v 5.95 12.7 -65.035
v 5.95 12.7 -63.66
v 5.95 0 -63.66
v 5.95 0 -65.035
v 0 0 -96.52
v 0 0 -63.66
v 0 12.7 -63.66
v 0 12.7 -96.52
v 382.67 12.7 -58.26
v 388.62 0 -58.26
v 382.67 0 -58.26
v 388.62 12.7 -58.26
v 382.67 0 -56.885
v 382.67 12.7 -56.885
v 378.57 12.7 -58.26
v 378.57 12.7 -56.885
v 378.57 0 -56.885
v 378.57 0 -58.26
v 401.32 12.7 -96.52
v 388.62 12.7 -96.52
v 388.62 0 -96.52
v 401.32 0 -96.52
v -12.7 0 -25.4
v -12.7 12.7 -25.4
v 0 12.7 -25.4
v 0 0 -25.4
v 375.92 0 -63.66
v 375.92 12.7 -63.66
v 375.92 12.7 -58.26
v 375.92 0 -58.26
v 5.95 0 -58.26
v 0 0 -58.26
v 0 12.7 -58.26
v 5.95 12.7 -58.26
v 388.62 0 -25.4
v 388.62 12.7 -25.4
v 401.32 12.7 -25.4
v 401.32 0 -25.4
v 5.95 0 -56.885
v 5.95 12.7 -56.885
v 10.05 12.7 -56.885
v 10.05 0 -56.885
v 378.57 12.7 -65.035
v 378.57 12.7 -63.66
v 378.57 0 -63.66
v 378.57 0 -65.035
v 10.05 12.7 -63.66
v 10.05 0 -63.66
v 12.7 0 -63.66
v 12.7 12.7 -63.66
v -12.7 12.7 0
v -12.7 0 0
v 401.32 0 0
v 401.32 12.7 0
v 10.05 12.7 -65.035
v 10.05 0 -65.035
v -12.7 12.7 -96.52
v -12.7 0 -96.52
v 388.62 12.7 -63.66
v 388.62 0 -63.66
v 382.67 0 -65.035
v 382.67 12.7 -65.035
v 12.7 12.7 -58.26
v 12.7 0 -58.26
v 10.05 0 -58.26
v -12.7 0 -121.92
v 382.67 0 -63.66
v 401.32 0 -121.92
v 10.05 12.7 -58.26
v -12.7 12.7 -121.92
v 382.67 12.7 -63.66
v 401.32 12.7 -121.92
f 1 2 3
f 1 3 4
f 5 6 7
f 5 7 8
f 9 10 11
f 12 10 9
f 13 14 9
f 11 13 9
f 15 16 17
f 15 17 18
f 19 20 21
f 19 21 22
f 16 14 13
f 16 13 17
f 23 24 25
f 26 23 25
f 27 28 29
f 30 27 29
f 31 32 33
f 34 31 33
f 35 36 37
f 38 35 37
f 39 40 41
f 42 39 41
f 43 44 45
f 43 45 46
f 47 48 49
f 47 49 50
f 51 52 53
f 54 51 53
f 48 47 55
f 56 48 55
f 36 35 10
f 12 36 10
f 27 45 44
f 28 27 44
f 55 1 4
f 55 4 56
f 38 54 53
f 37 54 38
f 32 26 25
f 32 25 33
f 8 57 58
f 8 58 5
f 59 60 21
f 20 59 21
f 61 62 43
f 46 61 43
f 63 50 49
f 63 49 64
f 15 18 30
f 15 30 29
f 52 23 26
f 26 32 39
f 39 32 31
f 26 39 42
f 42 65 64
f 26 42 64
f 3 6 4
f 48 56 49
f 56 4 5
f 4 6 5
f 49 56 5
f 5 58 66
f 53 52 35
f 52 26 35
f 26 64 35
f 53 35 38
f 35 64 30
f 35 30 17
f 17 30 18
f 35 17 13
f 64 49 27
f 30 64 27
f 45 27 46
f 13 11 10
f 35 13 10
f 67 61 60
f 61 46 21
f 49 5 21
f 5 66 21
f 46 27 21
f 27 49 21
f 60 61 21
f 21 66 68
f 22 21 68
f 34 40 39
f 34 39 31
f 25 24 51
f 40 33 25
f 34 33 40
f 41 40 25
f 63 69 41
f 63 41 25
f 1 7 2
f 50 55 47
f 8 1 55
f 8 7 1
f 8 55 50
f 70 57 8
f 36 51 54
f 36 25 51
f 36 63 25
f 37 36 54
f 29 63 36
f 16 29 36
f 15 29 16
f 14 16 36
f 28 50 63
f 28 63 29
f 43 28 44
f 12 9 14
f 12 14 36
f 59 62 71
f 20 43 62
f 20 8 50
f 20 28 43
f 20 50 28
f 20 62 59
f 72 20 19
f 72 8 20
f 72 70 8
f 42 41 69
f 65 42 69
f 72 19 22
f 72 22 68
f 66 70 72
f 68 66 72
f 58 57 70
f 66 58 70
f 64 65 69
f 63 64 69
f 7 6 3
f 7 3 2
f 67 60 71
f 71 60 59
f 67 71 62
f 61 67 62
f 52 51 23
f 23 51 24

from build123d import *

# Parameters (mm, degrees)
SKETCH1_W           = 388.62
SKETCH1_H           = 121.92
BOSS_EXTRUDE1_DEPTH = 12.7
SKETCH3_W           = 12.7
SKETCH3_H           = 25.4
TABS_DEPTH          = 12.7
SKETCH4_W           = 5.4
SKETCH4_H           = 12.7
SCREW_SLOT_DEPTH    = 12.7
SKETCH5_W           = 4.1
SKETCH5_H           = 8.15
NUT_SLOT_DEPTH      = 12.7


with BuildPart() as part:
    # Sketch1 → Boss-Extrude1 (new body)
    with BuildSketch(Plane(origin=(0, 0, 0), x_dir=(1, 0, 0), z_dir=(0, 1, 0))):
        with Locations((194.31, 60.96)):
            Rectangle(SKETCH1_W, SKETCH1_H)
    extrude(amount=BOSS_EXTRUDE1_DEPTH)

    # Sketch3 → tabs (add)
    with BuildSketch(Plane(origin=(0, 12.7, 0), x_dir=(1, 0, 0), z_dir=(0, 1, 0))):
        with Locations((-6.35, 109.22)):
            Rectangle(SKETCH3_W, SKETCH3_H)
        with Locations((-6.35, 12.7)):
            Rectangle(SKETCH3_W, SKETCH3_H)
        with Locations((394.97, 12.7)):
            Rectangle(SKETCH3_W, SKETCH3_H)
        with Locations((394.97, 109.22)):
            Rectangle(SKETCH3_W, SKETCH3_H)
    extrude(amount=-TABS_DEPTH)

    # Sketch4 → screw slot (cut)
    with BuildSketch(Plane.ZY):
        with Locations((-60.96, 6.35)):
            Rectangle(SKETCH4_W, SKETCH4_H)
    screw_slot = extrude(amount=-SCREW_SLOT_DEPTH, mode=Mode.SUBTRACT)

    # Sketch5 → nut slot (cut)
    with BuildSketch(Plane(origin=(0, 12.7, 0), x_dir=(1, 0, 0), z_dir=(0, 1, 0))):
        with Locations((8, 60.96)):
            Rectangle(SKETCH5_W, SKETCH5_H)
    nut_slot = extrude(amount=-NUT_SLOT_DEPTH, mode=Mode.SUBTRACT)

    # Mirror1: screw slot, nut slot across plane
    add(screw_slot.mirror(Plane(origin=(194.31, 0, 0), x_dir=(0, 0, 1), z_dir=(1, 0, 0))), mode=Mode.SUBTRACT)
    add(nut_slot.mirror(Plane(origin=(194.31, 0, 0), x_dir=(0, 0, 1), z_dir=(1, 0, 0))), mode=Mode.SUBTRACT)


solid = part.part
